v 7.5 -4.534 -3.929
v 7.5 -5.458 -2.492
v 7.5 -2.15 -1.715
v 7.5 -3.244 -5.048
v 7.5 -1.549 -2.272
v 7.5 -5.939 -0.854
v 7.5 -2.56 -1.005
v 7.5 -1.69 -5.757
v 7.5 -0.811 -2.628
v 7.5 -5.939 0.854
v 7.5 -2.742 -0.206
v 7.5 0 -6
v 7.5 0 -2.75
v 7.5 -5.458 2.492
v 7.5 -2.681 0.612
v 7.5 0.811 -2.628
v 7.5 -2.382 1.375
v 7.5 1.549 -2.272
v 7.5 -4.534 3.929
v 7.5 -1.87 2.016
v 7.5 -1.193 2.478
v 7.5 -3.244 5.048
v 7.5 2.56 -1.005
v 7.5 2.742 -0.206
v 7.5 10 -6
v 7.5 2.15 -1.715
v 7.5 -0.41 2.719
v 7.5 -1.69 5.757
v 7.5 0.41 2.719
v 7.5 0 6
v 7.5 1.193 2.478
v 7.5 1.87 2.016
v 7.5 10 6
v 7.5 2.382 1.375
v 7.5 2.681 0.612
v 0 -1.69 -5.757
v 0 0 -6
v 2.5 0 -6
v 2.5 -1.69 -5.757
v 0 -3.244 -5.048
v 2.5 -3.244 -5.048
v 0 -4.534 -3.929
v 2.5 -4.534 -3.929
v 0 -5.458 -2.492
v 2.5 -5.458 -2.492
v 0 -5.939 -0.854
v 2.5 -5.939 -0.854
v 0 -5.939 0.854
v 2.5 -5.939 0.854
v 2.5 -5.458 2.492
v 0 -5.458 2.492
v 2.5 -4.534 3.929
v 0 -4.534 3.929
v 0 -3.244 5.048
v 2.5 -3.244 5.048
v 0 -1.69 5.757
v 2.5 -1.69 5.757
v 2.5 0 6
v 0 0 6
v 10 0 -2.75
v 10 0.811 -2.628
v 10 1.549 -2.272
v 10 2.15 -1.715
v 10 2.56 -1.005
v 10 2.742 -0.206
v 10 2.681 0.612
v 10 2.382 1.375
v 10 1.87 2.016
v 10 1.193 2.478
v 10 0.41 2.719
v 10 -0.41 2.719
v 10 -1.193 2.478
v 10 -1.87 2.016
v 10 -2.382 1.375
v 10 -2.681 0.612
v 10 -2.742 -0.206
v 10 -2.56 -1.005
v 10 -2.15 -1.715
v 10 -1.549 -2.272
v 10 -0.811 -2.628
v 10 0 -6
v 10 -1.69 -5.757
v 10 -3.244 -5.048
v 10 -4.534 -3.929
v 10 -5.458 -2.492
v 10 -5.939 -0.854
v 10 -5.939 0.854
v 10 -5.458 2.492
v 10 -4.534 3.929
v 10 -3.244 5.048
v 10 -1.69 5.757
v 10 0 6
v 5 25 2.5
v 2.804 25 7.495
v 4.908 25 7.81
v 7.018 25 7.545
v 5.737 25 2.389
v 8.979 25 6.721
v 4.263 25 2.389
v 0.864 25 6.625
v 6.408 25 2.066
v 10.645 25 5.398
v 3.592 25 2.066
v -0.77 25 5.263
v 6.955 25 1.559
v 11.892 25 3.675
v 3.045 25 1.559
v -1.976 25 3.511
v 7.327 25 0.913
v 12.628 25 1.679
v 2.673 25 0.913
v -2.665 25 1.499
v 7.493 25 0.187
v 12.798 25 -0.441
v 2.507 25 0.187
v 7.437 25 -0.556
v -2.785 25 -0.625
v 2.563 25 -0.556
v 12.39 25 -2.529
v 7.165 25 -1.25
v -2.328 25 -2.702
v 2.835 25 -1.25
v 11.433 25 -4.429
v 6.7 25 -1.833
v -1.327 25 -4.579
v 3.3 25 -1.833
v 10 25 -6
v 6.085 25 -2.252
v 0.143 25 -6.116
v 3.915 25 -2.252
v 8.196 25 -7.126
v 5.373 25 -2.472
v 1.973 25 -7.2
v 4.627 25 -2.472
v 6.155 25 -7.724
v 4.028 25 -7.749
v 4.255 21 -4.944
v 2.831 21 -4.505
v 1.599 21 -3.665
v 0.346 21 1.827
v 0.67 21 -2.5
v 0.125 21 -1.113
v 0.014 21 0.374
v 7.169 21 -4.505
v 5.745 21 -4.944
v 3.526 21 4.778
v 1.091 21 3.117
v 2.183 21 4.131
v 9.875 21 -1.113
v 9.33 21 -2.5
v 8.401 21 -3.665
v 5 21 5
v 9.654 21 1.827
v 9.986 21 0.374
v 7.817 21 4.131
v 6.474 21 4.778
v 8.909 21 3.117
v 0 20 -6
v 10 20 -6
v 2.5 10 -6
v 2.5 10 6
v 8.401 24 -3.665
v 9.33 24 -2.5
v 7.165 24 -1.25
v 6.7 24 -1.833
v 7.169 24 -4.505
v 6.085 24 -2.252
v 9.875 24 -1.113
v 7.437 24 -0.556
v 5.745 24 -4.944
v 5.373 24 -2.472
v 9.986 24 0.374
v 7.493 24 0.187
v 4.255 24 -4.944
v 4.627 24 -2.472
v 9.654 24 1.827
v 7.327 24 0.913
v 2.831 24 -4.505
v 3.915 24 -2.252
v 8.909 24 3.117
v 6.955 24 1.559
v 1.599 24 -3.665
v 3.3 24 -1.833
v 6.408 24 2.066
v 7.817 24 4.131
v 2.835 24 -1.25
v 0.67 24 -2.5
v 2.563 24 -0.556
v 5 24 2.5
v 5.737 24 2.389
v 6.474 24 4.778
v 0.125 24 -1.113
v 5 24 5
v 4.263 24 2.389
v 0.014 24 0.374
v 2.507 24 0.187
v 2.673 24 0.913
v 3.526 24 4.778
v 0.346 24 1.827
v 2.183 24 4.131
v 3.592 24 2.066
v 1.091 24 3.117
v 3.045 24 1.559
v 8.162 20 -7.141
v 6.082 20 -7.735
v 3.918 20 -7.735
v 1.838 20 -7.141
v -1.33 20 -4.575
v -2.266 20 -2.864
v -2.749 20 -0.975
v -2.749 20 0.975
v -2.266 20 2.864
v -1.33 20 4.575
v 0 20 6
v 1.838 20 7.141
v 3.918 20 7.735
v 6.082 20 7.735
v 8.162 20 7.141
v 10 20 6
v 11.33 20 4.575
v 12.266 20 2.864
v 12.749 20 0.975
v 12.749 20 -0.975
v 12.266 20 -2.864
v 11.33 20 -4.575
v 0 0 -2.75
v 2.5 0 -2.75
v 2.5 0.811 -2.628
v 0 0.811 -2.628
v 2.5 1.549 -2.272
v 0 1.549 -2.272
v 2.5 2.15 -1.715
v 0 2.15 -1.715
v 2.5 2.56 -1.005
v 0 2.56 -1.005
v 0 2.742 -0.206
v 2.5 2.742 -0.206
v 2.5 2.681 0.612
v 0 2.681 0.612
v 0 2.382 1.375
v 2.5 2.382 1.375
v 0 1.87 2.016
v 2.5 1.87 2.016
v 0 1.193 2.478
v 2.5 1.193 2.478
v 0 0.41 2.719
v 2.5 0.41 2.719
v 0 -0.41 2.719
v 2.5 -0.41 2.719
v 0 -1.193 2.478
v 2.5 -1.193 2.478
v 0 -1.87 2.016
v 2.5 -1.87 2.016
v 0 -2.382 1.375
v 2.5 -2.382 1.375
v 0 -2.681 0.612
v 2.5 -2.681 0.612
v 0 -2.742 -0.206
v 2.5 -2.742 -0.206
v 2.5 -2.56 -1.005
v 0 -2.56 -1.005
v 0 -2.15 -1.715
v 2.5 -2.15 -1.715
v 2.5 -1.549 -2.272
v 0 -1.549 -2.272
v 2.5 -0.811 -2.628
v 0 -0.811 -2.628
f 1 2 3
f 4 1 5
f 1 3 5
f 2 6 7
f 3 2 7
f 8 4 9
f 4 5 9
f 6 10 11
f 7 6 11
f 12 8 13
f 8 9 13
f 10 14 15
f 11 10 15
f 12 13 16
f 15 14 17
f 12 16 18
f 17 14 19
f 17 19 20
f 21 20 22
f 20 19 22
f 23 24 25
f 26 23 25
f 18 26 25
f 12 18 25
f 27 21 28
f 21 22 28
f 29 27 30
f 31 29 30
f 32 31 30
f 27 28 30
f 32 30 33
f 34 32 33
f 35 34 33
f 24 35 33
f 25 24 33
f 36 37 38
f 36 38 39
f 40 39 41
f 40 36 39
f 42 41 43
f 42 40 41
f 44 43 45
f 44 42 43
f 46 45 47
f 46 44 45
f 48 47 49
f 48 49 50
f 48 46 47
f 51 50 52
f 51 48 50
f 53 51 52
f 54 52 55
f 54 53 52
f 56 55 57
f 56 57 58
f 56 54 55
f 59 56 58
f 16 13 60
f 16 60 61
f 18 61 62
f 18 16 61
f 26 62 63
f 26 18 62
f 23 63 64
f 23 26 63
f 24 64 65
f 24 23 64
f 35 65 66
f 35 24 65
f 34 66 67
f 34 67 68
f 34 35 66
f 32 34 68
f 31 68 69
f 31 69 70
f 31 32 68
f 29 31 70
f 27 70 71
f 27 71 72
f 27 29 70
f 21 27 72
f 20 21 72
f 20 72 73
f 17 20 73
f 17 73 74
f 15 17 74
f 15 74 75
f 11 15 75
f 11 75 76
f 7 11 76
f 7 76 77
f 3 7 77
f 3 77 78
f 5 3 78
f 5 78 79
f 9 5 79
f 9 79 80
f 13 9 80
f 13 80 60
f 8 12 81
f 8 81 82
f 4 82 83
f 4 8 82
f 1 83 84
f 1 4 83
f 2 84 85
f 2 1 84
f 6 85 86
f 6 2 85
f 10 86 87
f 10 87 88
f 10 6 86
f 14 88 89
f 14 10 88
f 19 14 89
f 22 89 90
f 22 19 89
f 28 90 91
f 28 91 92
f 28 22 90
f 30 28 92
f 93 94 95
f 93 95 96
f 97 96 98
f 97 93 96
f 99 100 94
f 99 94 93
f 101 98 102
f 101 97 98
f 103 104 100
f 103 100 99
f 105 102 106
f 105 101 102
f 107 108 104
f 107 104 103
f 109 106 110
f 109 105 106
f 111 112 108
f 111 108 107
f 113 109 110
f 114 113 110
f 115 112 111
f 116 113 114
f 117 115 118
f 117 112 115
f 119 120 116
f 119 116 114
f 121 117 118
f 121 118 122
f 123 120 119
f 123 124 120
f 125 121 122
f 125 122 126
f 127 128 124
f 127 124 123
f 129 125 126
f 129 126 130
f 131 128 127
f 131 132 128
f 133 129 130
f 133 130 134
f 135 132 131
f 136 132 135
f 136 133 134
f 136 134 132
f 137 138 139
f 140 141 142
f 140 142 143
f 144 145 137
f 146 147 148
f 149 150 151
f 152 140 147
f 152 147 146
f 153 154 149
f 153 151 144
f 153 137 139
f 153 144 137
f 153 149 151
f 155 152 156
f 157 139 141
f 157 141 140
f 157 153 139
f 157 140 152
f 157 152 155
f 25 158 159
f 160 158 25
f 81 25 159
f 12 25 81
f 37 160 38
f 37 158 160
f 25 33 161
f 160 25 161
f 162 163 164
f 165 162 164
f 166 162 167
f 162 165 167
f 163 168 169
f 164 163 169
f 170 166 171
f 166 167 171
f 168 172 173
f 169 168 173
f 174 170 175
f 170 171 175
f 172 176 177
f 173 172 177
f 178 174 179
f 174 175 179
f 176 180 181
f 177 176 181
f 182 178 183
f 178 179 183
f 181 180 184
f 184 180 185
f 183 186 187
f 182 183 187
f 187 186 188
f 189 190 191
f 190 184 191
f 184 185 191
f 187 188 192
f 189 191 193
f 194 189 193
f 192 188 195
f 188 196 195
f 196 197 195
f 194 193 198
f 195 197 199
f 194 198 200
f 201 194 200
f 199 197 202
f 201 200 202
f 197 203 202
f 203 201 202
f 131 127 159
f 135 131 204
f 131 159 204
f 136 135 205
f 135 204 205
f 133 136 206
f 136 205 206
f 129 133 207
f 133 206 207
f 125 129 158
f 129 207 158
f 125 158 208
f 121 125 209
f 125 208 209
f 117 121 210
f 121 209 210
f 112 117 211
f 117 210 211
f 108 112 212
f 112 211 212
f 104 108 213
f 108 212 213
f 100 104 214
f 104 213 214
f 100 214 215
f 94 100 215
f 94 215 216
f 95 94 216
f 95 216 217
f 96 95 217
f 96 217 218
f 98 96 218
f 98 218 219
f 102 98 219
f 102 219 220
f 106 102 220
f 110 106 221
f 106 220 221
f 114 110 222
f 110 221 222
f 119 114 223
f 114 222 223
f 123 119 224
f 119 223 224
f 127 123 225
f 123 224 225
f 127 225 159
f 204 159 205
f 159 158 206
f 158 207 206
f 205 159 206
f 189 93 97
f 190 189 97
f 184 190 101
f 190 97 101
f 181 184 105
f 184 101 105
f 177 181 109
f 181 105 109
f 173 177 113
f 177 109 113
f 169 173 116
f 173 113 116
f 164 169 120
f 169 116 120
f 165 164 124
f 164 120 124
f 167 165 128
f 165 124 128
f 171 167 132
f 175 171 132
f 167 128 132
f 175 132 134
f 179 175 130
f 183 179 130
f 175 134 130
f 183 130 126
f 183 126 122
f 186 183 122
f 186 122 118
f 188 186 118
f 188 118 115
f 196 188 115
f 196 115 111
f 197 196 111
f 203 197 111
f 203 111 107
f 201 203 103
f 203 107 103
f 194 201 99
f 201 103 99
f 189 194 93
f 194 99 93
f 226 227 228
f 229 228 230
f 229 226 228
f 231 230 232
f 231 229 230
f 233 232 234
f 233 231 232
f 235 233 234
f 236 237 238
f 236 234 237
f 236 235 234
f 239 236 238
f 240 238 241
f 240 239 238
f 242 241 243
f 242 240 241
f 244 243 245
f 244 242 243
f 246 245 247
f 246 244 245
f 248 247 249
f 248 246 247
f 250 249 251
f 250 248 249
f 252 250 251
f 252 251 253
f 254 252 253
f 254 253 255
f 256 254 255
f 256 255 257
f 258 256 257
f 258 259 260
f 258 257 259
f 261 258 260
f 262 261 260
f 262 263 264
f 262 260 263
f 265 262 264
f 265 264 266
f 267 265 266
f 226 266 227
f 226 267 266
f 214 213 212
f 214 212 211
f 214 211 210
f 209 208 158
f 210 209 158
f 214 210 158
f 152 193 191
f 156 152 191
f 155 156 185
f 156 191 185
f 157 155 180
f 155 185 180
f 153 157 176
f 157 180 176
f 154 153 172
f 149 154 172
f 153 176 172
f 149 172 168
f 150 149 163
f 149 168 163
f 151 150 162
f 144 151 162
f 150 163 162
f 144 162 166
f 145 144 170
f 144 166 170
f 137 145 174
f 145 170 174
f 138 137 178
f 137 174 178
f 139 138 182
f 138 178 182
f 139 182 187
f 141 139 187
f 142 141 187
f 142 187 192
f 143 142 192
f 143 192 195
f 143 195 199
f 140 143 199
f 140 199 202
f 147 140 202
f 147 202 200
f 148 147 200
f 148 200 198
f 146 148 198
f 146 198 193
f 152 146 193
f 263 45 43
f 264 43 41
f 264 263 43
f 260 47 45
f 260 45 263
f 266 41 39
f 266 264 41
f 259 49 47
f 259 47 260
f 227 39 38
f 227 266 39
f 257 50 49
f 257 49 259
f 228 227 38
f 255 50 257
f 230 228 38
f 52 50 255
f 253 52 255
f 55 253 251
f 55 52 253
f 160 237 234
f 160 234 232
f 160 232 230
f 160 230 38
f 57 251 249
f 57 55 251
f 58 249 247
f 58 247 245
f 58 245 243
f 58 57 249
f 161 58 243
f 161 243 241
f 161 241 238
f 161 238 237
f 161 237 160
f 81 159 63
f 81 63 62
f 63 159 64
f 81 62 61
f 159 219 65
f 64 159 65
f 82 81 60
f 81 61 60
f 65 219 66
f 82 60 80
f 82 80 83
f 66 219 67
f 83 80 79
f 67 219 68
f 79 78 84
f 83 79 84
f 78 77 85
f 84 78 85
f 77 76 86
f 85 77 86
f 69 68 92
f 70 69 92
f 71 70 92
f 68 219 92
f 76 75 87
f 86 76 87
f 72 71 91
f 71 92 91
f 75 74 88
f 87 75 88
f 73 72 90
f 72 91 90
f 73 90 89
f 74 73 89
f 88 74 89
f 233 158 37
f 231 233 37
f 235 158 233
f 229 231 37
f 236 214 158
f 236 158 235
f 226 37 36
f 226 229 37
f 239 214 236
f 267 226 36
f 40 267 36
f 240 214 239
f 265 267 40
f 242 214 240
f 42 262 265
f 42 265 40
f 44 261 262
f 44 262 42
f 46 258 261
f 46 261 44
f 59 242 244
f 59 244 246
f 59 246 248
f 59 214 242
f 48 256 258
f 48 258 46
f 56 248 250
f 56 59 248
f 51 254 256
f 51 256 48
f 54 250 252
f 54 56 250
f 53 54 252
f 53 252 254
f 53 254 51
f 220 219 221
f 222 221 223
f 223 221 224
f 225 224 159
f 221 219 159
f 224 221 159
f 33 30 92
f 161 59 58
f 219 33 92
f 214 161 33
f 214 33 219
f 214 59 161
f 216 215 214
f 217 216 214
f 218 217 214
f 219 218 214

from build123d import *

# Parameters (mm, degrees)
SKETCH1_R           = 2.75
BOSS_EXTRUDE1_DEPTH = 10
SKETCH3_R           = 7.810249676
BOSS_EXTRUDE3_DEPTH = 5
SKETCH4_R           = 5
CUT_EXTRUDE1_DEPTH  = 4
SKETCH5_R           = 6.128825336
SKETCH5_R_2         = 2.5
BOSS_EXTRUDE4_DEPTH = 1
SKETCH7_W           = 20.888038085
SKETCH7_H           = 5
CUT_EXTRUDE2_DEPTH  = 13


with BuildPart() as part:
    # Sketch1 → Boss-Extrude1 (new body)
    with BuildSketch(Plane.YZ):
        with BuildLine():
            Line((0, 6), (20, 6))
            Line((20, 6), (20, -6))
            Line((20, -6), (0, -6))
            ThreePointArc((0, -6), (-6, 0), (0, 6))
        make_face()
        with Locations(Location((0, 0, 0), (0, 0, 270))):
            Circle(SKETCH1_R, mode=Mode.SUBTRACT)
    extrude(amount=BOSS_EXTRUDE1_DEPTH)

    # Sketch3 → Boss-Extrude3 (add)
    with BuildSketch(Plane(origin=(0, 20, 0), x_dir=(-1, 0, 0), z_dir=(0, 1, 0))):
        with Locations(Location((-5, 0, 0), (0, 0, 230.194428908))):
            Circle(SKETCH3_R)
    extrude(amount=BOSS_EXTRUDE3_DEPTH)

    # Sketch4 → Cut-Extrude1 (cut)
    with BuildSketch(Plane(origin=(0, 25, 0), x_dir=(-1, 0, 0), z_dir=(0, 1, 0))):
        with Locations(Location((-5, 0, 0), (0, 0, 90))):
            Circle(SKETCH4_R)
    extrude(amount=-CUT_EXTRUDE1_DEPTH, mode=Mode.SUBTRACT)

    # Sketch5 → Boss-Extrude4 (add)
    with BuildSketch(Plane(origin=(0, 25, 0), x_dir=(-1, 0, 0), z_dir=(0, 1, 0))):
        with Locations((-5, 0)):
            Circle(SKETCH5_R)
        with Locations(Location((-5, 0, 0), (0, 0, 90))):
            Circle(SKETCH5_R_2, mode=Mode.SUBTRACT)
    extrude(amount=-BOSS_EXTRUDE4_DEPTH)

    # Sketch7 → Cut-Extrude2 (cut, symmetric)
    with BuildSketch(Plane(origin=(0, 0, 0), x_dir=(0, 1, 0), z_dir=(0, 0, 1))):
        with Locations((-0.444019042, -5)):
            Rectangle(SKETCH7_W, SKETCH7_H)
    extrude(amount=CUT_EXTRUDE2_DEPTH, both=True, mode=Mode.SUBTRACT)


solid = part.part
